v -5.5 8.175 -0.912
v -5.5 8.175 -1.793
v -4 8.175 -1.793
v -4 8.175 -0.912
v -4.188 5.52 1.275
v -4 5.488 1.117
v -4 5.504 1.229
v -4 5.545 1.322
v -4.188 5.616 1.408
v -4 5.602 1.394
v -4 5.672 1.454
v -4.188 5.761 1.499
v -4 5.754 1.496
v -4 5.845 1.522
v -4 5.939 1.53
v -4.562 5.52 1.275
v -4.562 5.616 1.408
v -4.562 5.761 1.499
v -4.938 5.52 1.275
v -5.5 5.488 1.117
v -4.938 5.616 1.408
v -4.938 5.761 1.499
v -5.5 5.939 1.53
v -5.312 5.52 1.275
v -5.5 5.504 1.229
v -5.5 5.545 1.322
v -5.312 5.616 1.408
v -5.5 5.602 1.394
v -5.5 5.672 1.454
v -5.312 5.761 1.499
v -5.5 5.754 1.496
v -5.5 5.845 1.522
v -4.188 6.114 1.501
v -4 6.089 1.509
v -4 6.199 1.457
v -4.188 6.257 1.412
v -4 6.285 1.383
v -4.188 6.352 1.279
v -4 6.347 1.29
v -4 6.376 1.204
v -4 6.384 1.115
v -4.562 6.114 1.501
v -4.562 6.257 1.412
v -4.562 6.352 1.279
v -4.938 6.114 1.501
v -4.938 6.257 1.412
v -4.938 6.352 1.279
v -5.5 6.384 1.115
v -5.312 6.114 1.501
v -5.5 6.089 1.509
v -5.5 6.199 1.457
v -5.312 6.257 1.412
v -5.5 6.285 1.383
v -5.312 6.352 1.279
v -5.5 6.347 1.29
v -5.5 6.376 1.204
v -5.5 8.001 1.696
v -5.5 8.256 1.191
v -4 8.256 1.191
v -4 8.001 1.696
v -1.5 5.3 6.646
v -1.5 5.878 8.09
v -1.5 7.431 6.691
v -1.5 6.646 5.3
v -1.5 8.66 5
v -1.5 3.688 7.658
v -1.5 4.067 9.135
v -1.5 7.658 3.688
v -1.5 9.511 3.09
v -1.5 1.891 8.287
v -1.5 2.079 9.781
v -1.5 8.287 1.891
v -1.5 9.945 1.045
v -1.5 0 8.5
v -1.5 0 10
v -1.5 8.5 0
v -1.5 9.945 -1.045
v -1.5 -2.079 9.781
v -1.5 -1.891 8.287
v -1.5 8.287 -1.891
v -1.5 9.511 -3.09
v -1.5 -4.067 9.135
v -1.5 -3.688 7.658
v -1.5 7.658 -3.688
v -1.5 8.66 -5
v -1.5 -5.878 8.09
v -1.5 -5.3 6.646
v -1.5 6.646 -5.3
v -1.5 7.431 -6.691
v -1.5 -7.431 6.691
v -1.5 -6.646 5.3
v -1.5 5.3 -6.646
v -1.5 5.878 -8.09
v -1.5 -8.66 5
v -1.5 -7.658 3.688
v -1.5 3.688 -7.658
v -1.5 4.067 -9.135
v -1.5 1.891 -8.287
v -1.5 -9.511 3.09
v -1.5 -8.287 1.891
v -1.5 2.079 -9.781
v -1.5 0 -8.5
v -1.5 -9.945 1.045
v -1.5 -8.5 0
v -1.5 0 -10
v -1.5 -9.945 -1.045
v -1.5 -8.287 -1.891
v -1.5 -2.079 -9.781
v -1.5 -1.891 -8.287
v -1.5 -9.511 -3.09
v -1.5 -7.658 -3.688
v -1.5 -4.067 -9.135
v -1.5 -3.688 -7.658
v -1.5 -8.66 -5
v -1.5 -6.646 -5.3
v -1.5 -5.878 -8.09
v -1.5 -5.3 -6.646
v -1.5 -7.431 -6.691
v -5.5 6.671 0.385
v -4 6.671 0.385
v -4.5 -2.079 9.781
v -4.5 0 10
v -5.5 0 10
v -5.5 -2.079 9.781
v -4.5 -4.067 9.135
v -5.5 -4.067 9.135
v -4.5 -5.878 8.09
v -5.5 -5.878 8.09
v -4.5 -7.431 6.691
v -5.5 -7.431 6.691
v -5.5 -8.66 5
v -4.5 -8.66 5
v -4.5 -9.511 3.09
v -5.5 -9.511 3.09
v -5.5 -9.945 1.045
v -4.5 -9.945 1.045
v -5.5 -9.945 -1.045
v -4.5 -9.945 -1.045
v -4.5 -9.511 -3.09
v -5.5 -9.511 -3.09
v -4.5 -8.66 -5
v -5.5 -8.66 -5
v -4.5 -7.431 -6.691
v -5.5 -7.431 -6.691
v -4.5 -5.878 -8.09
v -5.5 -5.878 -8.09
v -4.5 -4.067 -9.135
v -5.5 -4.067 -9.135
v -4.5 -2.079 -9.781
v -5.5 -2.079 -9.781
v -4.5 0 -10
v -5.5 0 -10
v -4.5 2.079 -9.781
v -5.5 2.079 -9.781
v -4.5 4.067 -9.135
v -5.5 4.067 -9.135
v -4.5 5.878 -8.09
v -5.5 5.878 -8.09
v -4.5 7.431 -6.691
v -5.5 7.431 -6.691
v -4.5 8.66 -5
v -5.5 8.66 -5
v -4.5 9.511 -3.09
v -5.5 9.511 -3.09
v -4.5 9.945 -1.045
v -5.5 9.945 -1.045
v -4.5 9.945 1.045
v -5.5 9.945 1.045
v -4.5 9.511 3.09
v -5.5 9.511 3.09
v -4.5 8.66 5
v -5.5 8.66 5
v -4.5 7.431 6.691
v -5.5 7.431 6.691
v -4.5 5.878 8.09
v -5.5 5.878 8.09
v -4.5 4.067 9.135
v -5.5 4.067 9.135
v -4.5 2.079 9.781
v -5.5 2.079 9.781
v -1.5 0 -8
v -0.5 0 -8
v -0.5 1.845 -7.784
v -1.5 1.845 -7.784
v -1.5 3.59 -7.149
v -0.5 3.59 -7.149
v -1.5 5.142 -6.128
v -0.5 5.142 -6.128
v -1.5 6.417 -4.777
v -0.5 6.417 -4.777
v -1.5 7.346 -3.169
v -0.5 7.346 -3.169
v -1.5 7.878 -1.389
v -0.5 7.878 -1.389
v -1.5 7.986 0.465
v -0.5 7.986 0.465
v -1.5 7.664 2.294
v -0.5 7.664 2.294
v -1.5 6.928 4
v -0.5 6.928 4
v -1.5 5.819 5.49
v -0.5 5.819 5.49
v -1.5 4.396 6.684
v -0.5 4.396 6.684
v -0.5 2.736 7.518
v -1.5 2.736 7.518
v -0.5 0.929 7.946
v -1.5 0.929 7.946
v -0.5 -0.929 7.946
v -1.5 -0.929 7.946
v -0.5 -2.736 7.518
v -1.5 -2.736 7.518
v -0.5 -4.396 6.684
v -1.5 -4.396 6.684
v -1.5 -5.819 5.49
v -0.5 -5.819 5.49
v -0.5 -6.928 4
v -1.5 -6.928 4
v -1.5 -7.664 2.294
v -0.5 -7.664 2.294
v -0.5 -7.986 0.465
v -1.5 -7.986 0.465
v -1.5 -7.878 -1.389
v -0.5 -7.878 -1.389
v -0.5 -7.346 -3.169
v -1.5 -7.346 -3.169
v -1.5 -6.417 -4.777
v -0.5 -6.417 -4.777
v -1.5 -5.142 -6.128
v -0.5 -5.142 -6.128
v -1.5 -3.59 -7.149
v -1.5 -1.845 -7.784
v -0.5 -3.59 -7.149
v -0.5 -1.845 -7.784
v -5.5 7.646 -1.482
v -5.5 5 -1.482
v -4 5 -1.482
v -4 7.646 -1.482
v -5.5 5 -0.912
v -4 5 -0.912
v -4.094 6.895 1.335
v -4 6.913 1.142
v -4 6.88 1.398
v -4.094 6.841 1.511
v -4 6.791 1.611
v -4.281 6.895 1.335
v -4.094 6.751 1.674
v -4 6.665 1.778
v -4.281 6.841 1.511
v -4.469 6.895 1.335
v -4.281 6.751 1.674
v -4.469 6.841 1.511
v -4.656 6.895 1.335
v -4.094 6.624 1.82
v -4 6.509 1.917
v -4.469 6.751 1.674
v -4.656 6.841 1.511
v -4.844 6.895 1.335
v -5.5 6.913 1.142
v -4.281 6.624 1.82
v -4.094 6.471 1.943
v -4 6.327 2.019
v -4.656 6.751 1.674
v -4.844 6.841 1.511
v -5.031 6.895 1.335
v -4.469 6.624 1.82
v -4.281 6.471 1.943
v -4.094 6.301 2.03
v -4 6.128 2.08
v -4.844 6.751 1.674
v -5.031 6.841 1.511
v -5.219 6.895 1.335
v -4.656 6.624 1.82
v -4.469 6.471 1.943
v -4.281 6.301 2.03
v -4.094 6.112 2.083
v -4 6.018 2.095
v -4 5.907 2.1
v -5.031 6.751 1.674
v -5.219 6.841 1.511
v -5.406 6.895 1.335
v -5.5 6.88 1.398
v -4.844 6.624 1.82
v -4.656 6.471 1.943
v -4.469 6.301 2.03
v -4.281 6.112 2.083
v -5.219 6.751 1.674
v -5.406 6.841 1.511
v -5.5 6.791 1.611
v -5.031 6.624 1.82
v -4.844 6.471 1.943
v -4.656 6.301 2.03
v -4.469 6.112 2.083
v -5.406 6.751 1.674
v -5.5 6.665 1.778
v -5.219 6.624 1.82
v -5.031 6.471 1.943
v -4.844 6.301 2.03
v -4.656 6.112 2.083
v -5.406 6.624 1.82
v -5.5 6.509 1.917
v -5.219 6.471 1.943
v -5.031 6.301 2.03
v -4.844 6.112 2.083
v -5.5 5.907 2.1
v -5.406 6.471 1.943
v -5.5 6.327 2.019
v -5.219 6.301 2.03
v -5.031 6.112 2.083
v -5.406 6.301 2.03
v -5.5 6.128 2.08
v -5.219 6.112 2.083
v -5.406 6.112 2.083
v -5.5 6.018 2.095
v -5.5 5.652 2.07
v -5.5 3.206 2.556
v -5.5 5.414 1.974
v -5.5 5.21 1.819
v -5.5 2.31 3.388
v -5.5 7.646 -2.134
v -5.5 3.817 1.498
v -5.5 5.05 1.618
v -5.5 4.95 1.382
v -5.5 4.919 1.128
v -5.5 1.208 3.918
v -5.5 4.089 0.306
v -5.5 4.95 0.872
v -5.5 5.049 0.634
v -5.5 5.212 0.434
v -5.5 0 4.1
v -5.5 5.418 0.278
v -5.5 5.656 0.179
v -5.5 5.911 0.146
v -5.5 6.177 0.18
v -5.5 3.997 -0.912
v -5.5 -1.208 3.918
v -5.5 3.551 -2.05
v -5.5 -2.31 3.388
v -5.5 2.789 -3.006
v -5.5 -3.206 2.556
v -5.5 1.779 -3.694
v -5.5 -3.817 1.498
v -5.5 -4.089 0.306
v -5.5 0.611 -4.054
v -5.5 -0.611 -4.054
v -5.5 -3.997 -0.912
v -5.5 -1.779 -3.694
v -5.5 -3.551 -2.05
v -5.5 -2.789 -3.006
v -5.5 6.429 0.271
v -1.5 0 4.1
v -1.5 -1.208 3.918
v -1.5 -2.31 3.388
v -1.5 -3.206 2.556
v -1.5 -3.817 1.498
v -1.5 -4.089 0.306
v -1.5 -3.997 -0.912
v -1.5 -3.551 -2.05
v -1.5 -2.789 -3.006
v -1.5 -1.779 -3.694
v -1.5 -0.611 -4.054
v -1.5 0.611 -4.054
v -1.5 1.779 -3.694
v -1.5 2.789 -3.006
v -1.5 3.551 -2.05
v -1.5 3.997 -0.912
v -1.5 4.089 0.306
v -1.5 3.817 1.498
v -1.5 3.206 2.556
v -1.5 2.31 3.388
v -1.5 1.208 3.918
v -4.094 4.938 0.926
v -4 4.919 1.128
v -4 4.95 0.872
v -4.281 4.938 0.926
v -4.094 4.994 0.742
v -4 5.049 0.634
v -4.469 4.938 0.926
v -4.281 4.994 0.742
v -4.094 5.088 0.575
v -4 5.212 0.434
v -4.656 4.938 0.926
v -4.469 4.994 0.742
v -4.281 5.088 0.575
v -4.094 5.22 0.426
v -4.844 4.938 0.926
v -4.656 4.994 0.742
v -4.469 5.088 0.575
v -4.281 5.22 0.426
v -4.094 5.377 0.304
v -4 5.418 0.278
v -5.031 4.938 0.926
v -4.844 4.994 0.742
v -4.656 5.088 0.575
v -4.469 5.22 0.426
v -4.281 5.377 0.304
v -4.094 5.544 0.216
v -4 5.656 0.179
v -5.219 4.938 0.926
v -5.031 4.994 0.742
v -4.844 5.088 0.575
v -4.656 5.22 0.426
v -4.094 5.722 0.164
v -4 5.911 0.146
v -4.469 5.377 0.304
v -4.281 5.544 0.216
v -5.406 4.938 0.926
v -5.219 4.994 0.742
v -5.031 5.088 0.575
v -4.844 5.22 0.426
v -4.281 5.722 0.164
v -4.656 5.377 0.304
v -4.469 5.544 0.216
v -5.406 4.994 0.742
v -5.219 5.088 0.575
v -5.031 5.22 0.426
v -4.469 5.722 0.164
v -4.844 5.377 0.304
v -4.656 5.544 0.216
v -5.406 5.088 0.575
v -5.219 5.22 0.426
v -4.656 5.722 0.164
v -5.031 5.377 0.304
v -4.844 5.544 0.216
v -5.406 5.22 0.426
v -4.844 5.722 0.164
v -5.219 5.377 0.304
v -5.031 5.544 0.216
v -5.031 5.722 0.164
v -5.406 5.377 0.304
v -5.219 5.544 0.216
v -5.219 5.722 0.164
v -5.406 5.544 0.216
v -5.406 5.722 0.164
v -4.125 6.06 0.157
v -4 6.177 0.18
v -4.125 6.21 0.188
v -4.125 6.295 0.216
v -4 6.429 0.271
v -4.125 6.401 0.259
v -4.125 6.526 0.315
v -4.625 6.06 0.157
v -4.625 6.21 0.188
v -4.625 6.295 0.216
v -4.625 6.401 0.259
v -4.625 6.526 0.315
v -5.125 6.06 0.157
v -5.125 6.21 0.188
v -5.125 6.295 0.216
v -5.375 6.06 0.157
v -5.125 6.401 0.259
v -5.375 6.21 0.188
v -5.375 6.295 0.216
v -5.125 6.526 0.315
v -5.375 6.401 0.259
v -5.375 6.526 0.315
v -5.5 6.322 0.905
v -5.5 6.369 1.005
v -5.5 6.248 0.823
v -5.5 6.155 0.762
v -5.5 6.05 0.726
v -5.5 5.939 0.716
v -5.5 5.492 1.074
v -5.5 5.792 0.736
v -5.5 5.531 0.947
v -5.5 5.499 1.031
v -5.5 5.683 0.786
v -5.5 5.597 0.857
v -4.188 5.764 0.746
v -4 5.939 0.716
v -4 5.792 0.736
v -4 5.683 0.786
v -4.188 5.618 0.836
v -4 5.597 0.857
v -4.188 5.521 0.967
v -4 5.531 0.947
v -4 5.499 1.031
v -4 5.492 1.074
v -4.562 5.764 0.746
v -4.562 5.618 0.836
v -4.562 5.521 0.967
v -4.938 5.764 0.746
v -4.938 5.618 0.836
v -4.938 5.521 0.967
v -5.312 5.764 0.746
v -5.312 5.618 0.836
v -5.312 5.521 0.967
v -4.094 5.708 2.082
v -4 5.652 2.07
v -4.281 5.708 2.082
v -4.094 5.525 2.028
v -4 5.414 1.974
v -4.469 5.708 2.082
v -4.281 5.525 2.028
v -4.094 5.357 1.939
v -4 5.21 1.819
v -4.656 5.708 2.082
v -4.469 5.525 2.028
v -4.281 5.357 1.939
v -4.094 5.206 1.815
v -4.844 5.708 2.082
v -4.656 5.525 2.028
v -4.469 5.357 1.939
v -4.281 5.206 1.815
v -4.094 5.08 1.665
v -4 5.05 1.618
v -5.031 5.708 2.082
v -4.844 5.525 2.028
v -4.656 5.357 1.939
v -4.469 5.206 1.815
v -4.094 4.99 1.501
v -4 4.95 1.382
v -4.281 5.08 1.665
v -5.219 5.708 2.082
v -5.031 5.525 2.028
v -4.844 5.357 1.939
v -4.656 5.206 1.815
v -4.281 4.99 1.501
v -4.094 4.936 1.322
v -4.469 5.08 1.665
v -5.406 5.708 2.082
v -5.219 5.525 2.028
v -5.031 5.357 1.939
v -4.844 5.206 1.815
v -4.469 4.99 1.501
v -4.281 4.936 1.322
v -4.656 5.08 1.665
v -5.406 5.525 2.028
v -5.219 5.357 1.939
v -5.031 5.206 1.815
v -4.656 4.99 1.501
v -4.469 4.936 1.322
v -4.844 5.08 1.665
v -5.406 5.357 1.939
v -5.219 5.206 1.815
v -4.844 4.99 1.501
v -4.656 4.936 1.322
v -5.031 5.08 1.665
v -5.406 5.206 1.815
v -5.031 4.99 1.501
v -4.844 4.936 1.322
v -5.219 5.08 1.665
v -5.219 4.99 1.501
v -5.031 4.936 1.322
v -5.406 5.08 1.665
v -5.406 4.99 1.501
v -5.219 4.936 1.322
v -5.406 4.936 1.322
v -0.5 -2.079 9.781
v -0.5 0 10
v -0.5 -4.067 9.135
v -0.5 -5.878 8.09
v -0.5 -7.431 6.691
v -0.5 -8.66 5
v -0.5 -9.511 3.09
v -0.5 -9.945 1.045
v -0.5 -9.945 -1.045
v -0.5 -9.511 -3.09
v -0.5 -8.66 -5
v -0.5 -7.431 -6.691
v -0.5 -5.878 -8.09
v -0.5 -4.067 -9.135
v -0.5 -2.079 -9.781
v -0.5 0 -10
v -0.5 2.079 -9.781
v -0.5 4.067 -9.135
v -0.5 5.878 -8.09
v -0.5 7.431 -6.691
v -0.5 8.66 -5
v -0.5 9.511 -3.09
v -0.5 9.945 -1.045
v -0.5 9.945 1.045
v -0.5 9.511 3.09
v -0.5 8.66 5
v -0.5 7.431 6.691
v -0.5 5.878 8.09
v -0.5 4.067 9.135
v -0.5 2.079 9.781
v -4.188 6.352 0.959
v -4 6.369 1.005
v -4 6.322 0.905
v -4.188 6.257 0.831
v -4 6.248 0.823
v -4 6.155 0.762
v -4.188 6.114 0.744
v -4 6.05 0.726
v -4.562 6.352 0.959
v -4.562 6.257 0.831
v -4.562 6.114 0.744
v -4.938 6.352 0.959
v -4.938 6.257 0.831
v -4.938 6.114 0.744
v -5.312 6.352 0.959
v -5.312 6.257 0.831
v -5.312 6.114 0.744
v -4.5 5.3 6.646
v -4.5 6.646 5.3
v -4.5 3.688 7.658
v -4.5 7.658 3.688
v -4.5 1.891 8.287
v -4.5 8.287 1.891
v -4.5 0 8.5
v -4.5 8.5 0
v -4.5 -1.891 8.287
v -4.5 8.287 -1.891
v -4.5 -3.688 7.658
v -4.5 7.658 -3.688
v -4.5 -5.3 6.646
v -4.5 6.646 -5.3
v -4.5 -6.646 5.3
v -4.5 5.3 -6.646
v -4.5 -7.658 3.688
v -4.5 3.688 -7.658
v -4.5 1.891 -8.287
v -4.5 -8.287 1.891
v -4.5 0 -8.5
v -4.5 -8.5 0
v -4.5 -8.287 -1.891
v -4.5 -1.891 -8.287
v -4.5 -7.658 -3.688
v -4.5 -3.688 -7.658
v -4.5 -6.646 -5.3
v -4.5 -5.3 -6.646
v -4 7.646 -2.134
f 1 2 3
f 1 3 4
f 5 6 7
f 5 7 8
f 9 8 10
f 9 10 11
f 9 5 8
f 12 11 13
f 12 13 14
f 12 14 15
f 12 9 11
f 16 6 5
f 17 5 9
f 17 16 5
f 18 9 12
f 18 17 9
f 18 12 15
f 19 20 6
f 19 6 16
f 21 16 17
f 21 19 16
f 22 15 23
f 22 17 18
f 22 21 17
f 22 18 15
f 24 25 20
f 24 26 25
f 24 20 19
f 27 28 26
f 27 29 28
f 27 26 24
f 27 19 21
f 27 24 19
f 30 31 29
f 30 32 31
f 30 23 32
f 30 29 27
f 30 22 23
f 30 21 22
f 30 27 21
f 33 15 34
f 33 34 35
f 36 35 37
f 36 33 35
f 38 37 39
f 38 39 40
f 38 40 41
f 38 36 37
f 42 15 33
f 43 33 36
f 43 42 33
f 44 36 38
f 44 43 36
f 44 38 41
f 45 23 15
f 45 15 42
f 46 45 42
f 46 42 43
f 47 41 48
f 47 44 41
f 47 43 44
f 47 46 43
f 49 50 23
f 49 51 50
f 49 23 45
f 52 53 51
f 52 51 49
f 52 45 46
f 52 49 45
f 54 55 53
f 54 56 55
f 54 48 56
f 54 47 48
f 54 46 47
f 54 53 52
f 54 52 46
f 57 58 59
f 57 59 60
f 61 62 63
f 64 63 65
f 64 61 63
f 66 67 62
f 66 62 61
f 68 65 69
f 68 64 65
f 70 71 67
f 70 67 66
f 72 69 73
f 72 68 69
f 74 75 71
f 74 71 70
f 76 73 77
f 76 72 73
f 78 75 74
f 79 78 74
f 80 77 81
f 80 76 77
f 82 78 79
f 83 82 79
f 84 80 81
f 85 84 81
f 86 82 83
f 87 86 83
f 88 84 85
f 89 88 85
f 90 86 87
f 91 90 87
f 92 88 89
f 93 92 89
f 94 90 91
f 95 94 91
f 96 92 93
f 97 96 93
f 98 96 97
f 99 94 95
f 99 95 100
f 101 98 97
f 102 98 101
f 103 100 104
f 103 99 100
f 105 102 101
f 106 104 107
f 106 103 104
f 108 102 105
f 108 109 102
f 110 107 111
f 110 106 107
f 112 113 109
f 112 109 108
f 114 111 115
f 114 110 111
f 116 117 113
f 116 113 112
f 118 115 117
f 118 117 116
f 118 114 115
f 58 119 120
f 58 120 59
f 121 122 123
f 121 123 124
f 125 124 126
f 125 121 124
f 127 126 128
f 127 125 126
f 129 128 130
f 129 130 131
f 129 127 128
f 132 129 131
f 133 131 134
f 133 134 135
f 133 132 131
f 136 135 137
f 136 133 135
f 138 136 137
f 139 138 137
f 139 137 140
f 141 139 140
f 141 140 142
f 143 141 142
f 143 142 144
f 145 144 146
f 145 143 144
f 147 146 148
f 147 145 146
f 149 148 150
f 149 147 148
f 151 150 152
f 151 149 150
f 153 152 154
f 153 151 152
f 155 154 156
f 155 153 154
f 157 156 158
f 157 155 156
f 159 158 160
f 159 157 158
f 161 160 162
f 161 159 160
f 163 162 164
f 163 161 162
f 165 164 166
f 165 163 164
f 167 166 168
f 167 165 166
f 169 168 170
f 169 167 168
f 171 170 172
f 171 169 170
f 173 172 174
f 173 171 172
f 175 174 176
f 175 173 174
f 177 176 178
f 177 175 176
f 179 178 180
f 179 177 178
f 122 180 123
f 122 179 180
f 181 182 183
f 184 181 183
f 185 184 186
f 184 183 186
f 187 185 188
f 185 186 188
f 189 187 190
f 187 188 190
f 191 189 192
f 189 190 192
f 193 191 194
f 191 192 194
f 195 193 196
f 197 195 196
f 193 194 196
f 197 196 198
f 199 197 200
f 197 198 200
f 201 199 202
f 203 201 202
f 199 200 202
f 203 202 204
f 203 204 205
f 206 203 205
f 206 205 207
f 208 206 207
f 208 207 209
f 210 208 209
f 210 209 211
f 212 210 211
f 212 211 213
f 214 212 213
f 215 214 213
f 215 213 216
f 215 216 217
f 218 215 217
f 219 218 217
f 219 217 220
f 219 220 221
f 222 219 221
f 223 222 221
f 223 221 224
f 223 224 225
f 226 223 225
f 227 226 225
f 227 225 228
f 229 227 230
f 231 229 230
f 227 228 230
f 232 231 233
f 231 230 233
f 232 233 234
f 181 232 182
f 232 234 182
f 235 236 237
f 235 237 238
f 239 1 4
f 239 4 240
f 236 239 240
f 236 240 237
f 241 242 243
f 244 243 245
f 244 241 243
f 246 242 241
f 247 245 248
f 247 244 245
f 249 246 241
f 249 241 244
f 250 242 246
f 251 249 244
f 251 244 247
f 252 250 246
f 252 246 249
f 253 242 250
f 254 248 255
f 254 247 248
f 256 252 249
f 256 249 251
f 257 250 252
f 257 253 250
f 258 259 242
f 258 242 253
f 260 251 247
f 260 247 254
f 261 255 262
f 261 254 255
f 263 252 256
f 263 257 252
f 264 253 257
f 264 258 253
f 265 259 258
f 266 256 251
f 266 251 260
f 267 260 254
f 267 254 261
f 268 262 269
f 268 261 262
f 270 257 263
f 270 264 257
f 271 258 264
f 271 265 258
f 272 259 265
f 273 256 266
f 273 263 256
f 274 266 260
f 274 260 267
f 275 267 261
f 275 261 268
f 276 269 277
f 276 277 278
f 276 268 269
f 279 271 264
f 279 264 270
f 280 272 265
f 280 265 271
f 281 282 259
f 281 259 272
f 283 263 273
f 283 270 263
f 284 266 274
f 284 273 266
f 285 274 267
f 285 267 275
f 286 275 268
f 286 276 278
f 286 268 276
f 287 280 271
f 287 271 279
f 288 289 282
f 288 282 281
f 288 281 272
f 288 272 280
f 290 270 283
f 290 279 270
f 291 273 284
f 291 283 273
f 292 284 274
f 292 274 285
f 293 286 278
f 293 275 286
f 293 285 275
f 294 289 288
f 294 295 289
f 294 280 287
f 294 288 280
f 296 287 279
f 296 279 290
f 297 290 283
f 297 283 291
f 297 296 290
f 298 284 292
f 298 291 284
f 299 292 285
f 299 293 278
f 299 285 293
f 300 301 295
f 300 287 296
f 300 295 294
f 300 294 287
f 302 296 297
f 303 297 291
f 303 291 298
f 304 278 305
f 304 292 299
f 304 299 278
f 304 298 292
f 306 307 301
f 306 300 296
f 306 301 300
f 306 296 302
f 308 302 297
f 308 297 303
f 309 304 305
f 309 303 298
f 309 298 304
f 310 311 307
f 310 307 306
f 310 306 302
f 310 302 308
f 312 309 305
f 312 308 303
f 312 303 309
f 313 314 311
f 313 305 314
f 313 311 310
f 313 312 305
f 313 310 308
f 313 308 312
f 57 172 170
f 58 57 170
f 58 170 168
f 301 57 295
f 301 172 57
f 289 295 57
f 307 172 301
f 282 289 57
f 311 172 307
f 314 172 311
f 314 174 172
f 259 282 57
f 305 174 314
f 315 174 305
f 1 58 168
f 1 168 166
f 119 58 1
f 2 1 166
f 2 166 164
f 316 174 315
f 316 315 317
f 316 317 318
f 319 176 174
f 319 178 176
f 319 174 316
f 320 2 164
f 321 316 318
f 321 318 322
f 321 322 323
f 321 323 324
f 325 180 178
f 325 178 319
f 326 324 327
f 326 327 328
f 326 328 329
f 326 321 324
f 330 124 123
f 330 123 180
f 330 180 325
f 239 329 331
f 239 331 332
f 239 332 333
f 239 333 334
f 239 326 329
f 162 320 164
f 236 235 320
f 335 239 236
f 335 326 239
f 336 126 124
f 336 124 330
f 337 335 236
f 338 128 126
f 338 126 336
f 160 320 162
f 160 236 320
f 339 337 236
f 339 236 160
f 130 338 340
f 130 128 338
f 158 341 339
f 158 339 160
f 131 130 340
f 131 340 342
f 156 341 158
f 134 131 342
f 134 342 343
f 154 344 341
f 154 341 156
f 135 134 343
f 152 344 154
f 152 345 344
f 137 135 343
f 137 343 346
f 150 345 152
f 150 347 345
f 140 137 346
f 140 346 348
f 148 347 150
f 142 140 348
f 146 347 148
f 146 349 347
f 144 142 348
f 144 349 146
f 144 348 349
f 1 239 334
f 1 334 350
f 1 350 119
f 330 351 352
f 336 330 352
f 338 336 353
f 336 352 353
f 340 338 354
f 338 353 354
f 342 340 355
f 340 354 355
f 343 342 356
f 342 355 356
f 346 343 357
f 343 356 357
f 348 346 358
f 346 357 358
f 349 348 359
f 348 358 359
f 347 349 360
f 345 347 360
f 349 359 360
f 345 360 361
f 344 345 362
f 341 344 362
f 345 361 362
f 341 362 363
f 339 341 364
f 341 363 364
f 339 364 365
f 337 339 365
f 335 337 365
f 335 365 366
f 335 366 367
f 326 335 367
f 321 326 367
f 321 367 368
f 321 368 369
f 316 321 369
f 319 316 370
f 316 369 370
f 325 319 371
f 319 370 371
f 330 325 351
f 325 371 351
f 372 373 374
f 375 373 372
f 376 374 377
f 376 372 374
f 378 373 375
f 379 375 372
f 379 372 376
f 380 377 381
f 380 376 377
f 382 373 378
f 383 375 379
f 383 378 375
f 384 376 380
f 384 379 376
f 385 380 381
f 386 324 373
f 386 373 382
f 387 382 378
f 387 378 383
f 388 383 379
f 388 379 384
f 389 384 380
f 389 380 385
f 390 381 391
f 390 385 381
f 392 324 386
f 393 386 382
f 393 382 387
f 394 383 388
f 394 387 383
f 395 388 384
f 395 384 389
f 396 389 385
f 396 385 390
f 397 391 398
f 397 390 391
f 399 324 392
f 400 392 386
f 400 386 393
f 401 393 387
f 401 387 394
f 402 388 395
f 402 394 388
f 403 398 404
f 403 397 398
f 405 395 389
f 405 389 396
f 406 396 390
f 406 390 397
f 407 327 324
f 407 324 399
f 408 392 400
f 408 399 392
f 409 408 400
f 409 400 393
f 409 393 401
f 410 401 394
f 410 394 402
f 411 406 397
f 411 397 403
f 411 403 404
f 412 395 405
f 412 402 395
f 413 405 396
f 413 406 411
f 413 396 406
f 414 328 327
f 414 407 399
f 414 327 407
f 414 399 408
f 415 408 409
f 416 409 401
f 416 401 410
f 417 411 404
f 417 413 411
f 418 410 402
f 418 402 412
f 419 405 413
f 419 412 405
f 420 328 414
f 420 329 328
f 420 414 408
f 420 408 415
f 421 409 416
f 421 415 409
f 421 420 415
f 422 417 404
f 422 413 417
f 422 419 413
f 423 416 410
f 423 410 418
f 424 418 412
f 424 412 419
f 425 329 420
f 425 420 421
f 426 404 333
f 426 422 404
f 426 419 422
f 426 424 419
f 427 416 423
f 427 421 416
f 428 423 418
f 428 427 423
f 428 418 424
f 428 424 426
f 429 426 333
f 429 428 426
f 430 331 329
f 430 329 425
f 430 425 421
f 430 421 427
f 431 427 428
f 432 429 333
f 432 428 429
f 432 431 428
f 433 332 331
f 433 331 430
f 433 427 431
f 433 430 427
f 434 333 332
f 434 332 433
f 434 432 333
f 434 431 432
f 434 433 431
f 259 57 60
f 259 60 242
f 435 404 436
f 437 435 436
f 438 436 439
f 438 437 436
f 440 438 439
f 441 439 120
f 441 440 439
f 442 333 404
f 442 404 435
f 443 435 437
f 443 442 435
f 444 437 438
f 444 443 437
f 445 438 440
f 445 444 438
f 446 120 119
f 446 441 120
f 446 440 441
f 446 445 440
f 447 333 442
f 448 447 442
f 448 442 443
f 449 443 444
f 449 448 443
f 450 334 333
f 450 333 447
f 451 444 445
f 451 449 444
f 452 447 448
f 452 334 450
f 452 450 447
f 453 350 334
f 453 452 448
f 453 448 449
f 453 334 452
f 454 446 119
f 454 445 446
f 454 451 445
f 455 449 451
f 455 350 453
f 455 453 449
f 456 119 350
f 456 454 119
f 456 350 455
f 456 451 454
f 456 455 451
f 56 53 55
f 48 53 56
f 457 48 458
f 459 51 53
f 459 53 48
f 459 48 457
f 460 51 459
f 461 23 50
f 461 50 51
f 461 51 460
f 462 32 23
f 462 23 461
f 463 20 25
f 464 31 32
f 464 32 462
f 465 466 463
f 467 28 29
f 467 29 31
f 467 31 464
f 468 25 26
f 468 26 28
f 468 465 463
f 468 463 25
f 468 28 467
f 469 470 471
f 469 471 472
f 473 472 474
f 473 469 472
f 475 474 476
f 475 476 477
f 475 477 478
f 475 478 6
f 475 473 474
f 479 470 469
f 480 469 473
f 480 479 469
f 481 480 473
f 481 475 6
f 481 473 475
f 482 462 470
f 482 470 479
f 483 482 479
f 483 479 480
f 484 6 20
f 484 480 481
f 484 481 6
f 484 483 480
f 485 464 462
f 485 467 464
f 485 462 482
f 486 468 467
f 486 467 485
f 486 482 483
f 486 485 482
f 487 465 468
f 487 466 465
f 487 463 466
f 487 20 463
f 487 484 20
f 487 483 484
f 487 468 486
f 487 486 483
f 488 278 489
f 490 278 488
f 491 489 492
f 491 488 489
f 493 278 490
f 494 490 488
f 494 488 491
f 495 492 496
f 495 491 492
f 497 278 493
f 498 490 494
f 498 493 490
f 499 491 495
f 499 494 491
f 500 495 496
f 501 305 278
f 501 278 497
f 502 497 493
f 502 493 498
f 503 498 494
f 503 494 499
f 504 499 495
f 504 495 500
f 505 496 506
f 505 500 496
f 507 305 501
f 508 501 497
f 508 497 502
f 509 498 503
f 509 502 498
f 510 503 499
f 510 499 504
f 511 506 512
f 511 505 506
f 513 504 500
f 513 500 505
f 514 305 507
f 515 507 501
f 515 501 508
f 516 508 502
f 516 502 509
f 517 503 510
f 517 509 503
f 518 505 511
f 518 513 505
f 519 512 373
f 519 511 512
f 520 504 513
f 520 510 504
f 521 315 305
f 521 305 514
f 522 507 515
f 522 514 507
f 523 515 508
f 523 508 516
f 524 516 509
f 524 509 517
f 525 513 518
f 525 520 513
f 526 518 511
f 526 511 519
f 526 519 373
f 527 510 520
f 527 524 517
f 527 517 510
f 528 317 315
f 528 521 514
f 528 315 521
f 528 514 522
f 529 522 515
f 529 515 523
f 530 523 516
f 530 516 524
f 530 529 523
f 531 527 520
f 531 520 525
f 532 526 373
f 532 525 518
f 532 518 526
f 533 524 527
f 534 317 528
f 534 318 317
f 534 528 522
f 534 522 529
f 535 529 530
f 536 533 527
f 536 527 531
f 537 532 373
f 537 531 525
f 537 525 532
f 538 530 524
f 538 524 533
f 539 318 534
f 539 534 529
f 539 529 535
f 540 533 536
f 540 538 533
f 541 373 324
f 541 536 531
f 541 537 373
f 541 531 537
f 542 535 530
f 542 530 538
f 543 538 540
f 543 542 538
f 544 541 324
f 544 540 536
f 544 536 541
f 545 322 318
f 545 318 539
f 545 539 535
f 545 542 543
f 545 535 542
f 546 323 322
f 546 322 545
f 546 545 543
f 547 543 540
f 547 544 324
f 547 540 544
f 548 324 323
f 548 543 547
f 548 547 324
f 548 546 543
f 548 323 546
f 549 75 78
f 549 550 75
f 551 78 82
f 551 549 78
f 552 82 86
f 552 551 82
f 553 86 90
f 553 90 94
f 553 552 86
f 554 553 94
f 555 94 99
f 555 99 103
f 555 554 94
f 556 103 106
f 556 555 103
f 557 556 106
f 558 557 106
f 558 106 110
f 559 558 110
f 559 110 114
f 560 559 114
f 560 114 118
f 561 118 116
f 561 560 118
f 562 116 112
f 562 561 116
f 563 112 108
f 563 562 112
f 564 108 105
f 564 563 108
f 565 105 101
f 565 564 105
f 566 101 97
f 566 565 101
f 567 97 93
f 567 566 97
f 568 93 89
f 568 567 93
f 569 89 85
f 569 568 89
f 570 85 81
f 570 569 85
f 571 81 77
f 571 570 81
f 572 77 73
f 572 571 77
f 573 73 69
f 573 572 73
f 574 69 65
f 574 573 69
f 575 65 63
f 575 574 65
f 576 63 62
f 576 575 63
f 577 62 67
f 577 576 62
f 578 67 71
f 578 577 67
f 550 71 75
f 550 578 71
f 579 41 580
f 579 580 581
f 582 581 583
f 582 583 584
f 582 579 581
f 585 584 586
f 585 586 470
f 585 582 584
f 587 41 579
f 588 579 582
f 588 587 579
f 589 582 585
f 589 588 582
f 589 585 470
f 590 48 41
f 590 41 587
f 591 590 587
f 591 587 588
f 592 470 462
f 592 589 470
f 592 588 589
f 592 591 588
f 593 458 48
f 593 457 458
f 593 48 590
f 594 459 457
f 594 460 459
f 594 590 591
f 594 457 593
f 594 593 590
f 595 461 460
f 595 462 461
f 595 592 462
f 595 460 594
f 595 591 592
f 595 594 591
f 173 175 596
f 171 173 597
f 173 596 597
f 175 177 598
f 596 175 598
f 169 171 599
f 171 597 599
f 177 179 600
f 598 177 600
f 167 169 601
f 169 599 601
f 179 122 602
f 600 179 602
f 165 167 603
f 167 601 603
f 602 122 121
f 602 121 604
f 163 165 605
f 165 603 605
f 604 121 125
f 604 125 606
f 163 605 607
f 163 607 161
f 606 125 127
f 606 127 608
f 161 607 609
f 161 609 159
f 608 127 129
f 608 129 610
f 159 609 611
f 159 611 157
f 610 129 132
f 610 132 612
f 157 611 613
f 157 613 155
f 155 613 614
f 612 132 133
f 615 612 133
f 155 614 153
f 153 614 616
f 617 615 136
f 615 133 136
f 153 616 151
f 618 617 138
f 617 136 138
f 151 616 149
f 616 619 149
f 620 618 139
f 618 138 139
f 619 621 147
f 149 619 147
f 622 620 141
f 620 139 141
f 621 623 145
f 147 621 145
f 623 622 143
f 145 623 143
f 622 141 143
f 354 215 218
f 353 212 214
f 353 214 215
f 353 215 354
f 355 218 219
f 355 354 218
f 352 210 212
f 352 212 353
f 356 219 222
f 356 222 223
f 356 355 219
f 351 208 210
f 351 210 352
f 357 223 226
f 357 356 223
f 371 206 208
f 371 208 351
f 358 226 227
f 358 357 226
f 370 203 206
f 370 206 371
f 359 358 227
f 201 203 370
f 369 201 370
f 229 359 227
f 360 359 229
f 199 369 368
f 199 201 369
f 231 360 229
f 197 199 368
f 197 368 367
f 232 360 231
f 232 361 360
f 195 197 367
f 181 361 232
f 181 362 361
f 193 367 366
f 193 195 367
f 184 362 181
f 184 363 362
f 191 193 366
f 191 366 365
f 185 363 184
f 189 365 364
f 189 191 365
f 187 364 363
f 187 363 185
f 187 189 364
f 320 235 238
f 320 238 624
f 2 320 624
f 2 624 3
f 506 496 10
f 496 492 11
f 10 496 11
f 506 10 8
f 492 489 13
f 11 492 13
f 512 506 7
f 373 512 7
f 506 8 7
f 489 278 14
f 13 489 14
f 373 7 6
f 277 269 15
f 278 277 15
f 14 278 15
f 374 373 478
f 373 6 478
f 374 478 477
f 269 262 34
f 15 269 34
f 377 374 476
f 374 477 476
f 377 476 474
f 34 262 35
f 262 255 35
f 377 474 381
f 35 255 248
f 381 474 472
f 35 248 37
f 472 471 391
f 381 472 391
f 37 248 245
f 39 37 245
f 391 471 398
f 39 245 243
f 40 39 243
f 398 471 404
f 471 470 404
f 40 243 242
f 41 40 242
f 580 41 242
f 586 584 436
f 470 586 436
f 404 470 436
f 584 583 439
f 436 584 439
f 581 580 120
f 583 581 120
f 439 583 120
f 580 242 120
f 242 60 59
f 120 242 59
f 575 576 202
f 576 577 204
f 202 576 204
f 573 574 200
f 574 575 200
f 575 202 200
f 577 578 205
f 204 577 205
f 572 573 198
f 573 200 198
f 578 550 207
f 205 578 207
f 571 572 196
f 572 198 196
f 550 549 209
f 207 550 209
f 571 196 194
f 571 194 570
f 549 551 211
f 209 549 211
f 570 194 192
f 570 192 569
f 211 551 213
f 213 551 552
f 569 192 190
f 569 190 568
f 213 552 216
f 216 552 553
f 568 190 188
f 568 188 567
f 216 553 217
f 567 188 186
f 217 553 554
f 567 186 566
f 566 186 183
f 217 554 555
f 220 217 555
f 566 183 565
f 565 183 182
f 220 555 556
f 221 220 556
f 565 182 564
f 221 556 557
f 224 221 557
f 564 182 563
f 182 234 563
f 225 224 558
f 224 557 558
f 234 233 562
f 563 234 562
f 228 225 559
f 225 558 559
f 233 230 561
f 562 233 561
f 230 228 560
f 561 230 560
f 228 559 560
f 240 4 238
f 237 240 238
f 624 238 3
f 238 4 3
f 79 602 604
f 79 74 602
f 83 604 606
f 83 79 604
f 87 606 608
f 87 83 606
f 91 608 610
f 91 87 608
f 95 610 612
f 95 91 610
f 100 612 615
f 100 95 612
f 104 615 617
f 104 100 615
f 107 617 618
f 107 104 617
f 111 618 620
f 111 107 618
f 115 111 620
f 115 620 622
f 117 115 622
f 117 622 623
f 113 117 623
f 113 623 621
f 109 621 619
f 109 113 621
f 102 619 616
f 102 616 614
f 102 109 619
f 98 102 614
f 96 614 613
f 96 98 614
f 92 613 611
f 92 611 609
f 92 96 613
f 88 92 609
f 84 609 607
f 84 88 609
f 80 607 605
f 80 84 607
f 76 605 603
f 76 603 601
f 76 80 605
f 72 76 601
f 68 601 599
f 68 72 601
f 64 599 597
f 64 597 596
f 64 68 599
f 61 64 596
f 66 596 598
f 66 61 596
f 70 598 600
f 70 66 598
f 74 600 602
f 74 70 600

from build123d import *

# Parameters (mm, degrees)
SKETCH1_W          = 5
SKETCH1_H          = 5.9
SKETCH2_W          = 3
SKETCH2_H          = 1.5
SKETCH3_R          = 8
CUT_EXTRUDE1_DEPTH = 1.5
CUT_EXTRUDE2_DEPTH = 1.5


with BuildPart() as part:
    # Sketch1 → Revolve1 (revolve)
    with BuildSketch(Plane.XY, mode=Mode.PRIVATE) as revolve1_sk:
        with Locations((-3, 7.05)):
            Rectangle(SKETCH1_W, SKETCH1_H)
    revolve(revolve1_sk.sketch.rotate(Axis((0, 0, 0), (1, 0, 0)), 90), axis=Axis((0, 0, 0), (1, 0, 0)))

    # Sketch2 → Cut-Revolve1 (revolve, cut)
    with BuildSketch(Plane.XY, mode=Mode.PRIVATE) as cut_revolve1_sk:
        with Locations((-3, 9.25)):
            Rectangle(SKETCH2_W, SKETCH2_H)
    revolve(cut_revolve1_sk.sketch.rotate(Axis((0, 0, 0), (1, 0, 0)), 90), axis=Axis((0, 0, 0), (1, 0, 0)), mode=Mode.SUBTRACT)

    # Sketch3 → Cut-Extrude1 (cut)
    with BuildSketch(Plane(origin=(0, 0, 0), x_dir=(0, 0, -1), z_dir=(1, 0, 0))):
        Circle(SKETCH3_R)
    extrude(amount=-CUT_EXTRUDE1_DEPTH, mode=Mode.SUBTRACT)

    # Sketch5 → Cut-Extrude2 (cut)
    # profile 1 of 2: a face of its own
    with BuildSketch(Plane.ZY.offset(5.5)):
        Polygon((-1.793384415, 8.175), (-0.9125, 8.175), (-0.9125, 5), (-1.482371795, 5), (-1.482371795, 7.645833333), (-2.133653846, 7.645833333), align=None)
    # profile 2 of 2: a face of its own
    with BuildSketch(Plane.ZY.offset(5.5)):
        with BuildLine():
            Line((1.191446314, 8.256410256), (1.695808293, 8.00073117))
            Line((1.695808293, 8.00073117), (1.142472957, 6.913141026))
            add(Edge.make_bspline(
                [(1.142472957, 6.913141026), (1.175163489, 6.912294651), (1.239552854, 6.910627578), (1.334288739, 6.897154014), (1.424858008, 6.873861453), (1.512173869, 6.842987227), (1.595168965, 6.801522834), (1.675179981, 6.752198775), (1.750136991, 6.69204278), (1.821758695, 6.62539313), (1.886883941, 6.551554895), (1.943456732, 6.472213367), (1.99275892, 6.389298934), (2.031084458, 6.300956598), (2.061999112, 6.208650736), (2.084305396, 6.11201236), (2.097031755, 6.010761626), (2.098786295, 5.941977417), (2.099679487, 5.906961138)],
                knots=[0, 0, 0, 0, 1.013260694, 1.995783107, 2.958651975, 3.908806537, 4.861209129, 5.829647963, 6.817170299, 7.835534541, 8.860094905, 9.863329007, 10.853101798, 11.844815043, 12.84250023, 13.867713965, 14.914507806, 16, 16, 16, 16], degree=3))
            add(Edge.make_bspline(
                [(2.099679487, 5.906961138), (2.098842493, 5.873207569), (2.097188113, 5.806491238), (2.083512477, 5.708501914), (2.06141193, 5.614486889), (2.02982581, 5.524633922), (1.989677297, 5.438503809), (1.940578386, 5.356147091), (1.882121896, 5.278179194), (1.81581818, 5.205014401), (1.743336781, 5.138324152), (1.666937439, 5.079045977), (1.585972755, 5.030079955), (1.501973056, 4.988727002), (1.413391857, 4.957868741), (1.32155478, 4.934576099), (1.225765397, 4.921135234), (1.160746018, 4.91944503), (1.127844551, 4.918589744)],
                knots=[0, 0, 0, 0, 1.049934834, 2.075270938, 3.072134561, 4.05064612, 5.033440221, 6.024524368, 7.028587226, 8.060776465, 9.092543989, 10.090062252, 11.064205434, 12.031961459, 12.998029633, 13.977230324, 14.976426867, 16, 16, 16, 16], degree=3))
            add(Edge.make_bspline(
                [(1.127844551, 4.918589744), (1.093439615, 4.919291632), (1.025786964, 4.9206718), (0.926794204, 4.936126046), (0.831851626, 4.959390259), (0.741492825, 4.992607602), (0.655155886, 5.034903587), (0.57385727, 5.087240616), (0.496912148, 5.149041549), (0.42514087, 5.218915965), (0.360480297, 5.295453826), (0.302808469, 5.374920054), (0.254018029, 5.457439347), (0.214523305, 5.542923478), (0.183708605, 5.631100047), (0.162267859, 5.722136406), (0.148297235, 5.81579108), (0.146659497, 5.879350442), (0.145833333, 5.911413261)],
                knots=[0, 0, 0, 0, 1.063775006, 2.091769615, 3.092589432, 4.084662827, 5.064601646, 6.061867366, 7.070035304, 8.113879863, 9.156342271, 10.166834137, 11.149076039, 12.117706134, 13.076241869, 14.034148791, 15.008317125, 16, 16, 16, 16], degree=3))
            add(Edge.make_bspline(
                [(0.145833333, 5.911413261), (0.146269862, 5.936242164), (0.14714535, 5.986038176), (0.155943478, 6.060604999), (0.169319723, 6.135367552), (0.184824543, 6.198454562), (0.20078984, 6.251801232), (0.216859033, 6.296947076), (0.236773258, 6.347049092), (0.259538168, 6.40223522), (0.285869634, 6.462439071), (0.315630108, 6.527496544), (0.348893678, 6.597900304), (0.372615185, 6.646256786), (0.384975962, 6.671454327)],
                knots=[0, 0, 0, 0, 1.110454016, 2.227089276, 3.35462975, 4.507227546, 5.131400587, 5.845402449, 6.650387134, 7.543487832, 8.516250726, 9.590168902, 10.744287919, 12, 12, 12, 12], degree=3))
            Line((0.384975962, 6.671454327), (1.191446314, 8.256410256))
        make_face()
        with BuildLine():
            add(Edge.make_bspline(
                [(1.115124199, 6.383974359), (1.087780016, 6.382720139), (1.034271038, 6.380265795), (0.958189275, 6.354562713), (0.888819969, 6.314240974), (0.828689797, 6.258085155), (0.77839644, 6.190976745), (0.741439117, 6.114430641), (0.719207234, 6.029468327), (0.716897483, 5.970064094), (0.715705128, 5.939398037)],
                knots=[0, 0, 0, 0, 0.981744412, 1.921144944, 2.858899012, 3.85339082, 4.86292663, 5.863643845, 6.897155691, 8, 8, 8, 8], degree=3))
            add(Edge.make_bspline(
                [(0.715705128, 5.939398037), (0.717116914, 5.908721768), (0.719862931, 5.849054373), (0.742930763, 5.763283067), (0.780699961, 5.684998689), (0.833668853, 5.617000948), (0.895853571, 5.560557558), (0.964809047, 5.518814972), (1.039385079, 5.493171132), (1.090971142, 5.490042243), (1.117032252, 5.488461538)],
                knots=[0, 0, 0, 0, 1.098279937, 2.136227893, 3.159405121, 4.194678092, 5.206500211, 6.154139736, 7.067477469, 8, 8, 8, 8], degree=3))
            add(Edge.make_bspline(
                [(1.117032252, 5.488461538), (1.144555729, 5.490070396), (1.198534047, 5.493225646), (1.276401312, 5.51779044), (1.347533526, 5.558833701), (1.410428162, 5.615096382), (1.464453459, 5.682318178), (1.501833508, 5.761062388), (1.525967776, 5.847452761), (1.528499022, 5.908062449), (1.529807692, 5.939398037)],
                knots=[0, 0, 0, 0, 0.96921794, 1.900804717, 2.848419905, 3.844199796, 4.861108892, 5.867439427, 6.897452859, 8, 8, 8, 8], degree=3))
            add(Edge.make_bspline(
                [(1.529807692, 5.939398037), (1.528316878, 5.970046189), (1.525429742, 6.029399913), (1.503743929, 6.114760256), (1.465025374, 6.191011323), (1.41359409, 6.258362168), (1.351394556, 6.314492947), (1.279248949, 6.354880703), (1.199691644, 6.380220258), (1.143724347, 6.382704747), (1.115124199, 6.383974359)],
                knots=[0, 0, 0, 0, 1.083229974, 2.097801324, 3.086792542, 4.086858909, 5.079819718, 6.026392613, 6.991456328, 8, 8, 8, 8], degree=3))
        make_face(mode=Mode.SUBTRACT)
    extrude(amount=-CUT_EXTRUDE2_DEPTH, mode=Mode.SUBTRACT)


solid = part.part
